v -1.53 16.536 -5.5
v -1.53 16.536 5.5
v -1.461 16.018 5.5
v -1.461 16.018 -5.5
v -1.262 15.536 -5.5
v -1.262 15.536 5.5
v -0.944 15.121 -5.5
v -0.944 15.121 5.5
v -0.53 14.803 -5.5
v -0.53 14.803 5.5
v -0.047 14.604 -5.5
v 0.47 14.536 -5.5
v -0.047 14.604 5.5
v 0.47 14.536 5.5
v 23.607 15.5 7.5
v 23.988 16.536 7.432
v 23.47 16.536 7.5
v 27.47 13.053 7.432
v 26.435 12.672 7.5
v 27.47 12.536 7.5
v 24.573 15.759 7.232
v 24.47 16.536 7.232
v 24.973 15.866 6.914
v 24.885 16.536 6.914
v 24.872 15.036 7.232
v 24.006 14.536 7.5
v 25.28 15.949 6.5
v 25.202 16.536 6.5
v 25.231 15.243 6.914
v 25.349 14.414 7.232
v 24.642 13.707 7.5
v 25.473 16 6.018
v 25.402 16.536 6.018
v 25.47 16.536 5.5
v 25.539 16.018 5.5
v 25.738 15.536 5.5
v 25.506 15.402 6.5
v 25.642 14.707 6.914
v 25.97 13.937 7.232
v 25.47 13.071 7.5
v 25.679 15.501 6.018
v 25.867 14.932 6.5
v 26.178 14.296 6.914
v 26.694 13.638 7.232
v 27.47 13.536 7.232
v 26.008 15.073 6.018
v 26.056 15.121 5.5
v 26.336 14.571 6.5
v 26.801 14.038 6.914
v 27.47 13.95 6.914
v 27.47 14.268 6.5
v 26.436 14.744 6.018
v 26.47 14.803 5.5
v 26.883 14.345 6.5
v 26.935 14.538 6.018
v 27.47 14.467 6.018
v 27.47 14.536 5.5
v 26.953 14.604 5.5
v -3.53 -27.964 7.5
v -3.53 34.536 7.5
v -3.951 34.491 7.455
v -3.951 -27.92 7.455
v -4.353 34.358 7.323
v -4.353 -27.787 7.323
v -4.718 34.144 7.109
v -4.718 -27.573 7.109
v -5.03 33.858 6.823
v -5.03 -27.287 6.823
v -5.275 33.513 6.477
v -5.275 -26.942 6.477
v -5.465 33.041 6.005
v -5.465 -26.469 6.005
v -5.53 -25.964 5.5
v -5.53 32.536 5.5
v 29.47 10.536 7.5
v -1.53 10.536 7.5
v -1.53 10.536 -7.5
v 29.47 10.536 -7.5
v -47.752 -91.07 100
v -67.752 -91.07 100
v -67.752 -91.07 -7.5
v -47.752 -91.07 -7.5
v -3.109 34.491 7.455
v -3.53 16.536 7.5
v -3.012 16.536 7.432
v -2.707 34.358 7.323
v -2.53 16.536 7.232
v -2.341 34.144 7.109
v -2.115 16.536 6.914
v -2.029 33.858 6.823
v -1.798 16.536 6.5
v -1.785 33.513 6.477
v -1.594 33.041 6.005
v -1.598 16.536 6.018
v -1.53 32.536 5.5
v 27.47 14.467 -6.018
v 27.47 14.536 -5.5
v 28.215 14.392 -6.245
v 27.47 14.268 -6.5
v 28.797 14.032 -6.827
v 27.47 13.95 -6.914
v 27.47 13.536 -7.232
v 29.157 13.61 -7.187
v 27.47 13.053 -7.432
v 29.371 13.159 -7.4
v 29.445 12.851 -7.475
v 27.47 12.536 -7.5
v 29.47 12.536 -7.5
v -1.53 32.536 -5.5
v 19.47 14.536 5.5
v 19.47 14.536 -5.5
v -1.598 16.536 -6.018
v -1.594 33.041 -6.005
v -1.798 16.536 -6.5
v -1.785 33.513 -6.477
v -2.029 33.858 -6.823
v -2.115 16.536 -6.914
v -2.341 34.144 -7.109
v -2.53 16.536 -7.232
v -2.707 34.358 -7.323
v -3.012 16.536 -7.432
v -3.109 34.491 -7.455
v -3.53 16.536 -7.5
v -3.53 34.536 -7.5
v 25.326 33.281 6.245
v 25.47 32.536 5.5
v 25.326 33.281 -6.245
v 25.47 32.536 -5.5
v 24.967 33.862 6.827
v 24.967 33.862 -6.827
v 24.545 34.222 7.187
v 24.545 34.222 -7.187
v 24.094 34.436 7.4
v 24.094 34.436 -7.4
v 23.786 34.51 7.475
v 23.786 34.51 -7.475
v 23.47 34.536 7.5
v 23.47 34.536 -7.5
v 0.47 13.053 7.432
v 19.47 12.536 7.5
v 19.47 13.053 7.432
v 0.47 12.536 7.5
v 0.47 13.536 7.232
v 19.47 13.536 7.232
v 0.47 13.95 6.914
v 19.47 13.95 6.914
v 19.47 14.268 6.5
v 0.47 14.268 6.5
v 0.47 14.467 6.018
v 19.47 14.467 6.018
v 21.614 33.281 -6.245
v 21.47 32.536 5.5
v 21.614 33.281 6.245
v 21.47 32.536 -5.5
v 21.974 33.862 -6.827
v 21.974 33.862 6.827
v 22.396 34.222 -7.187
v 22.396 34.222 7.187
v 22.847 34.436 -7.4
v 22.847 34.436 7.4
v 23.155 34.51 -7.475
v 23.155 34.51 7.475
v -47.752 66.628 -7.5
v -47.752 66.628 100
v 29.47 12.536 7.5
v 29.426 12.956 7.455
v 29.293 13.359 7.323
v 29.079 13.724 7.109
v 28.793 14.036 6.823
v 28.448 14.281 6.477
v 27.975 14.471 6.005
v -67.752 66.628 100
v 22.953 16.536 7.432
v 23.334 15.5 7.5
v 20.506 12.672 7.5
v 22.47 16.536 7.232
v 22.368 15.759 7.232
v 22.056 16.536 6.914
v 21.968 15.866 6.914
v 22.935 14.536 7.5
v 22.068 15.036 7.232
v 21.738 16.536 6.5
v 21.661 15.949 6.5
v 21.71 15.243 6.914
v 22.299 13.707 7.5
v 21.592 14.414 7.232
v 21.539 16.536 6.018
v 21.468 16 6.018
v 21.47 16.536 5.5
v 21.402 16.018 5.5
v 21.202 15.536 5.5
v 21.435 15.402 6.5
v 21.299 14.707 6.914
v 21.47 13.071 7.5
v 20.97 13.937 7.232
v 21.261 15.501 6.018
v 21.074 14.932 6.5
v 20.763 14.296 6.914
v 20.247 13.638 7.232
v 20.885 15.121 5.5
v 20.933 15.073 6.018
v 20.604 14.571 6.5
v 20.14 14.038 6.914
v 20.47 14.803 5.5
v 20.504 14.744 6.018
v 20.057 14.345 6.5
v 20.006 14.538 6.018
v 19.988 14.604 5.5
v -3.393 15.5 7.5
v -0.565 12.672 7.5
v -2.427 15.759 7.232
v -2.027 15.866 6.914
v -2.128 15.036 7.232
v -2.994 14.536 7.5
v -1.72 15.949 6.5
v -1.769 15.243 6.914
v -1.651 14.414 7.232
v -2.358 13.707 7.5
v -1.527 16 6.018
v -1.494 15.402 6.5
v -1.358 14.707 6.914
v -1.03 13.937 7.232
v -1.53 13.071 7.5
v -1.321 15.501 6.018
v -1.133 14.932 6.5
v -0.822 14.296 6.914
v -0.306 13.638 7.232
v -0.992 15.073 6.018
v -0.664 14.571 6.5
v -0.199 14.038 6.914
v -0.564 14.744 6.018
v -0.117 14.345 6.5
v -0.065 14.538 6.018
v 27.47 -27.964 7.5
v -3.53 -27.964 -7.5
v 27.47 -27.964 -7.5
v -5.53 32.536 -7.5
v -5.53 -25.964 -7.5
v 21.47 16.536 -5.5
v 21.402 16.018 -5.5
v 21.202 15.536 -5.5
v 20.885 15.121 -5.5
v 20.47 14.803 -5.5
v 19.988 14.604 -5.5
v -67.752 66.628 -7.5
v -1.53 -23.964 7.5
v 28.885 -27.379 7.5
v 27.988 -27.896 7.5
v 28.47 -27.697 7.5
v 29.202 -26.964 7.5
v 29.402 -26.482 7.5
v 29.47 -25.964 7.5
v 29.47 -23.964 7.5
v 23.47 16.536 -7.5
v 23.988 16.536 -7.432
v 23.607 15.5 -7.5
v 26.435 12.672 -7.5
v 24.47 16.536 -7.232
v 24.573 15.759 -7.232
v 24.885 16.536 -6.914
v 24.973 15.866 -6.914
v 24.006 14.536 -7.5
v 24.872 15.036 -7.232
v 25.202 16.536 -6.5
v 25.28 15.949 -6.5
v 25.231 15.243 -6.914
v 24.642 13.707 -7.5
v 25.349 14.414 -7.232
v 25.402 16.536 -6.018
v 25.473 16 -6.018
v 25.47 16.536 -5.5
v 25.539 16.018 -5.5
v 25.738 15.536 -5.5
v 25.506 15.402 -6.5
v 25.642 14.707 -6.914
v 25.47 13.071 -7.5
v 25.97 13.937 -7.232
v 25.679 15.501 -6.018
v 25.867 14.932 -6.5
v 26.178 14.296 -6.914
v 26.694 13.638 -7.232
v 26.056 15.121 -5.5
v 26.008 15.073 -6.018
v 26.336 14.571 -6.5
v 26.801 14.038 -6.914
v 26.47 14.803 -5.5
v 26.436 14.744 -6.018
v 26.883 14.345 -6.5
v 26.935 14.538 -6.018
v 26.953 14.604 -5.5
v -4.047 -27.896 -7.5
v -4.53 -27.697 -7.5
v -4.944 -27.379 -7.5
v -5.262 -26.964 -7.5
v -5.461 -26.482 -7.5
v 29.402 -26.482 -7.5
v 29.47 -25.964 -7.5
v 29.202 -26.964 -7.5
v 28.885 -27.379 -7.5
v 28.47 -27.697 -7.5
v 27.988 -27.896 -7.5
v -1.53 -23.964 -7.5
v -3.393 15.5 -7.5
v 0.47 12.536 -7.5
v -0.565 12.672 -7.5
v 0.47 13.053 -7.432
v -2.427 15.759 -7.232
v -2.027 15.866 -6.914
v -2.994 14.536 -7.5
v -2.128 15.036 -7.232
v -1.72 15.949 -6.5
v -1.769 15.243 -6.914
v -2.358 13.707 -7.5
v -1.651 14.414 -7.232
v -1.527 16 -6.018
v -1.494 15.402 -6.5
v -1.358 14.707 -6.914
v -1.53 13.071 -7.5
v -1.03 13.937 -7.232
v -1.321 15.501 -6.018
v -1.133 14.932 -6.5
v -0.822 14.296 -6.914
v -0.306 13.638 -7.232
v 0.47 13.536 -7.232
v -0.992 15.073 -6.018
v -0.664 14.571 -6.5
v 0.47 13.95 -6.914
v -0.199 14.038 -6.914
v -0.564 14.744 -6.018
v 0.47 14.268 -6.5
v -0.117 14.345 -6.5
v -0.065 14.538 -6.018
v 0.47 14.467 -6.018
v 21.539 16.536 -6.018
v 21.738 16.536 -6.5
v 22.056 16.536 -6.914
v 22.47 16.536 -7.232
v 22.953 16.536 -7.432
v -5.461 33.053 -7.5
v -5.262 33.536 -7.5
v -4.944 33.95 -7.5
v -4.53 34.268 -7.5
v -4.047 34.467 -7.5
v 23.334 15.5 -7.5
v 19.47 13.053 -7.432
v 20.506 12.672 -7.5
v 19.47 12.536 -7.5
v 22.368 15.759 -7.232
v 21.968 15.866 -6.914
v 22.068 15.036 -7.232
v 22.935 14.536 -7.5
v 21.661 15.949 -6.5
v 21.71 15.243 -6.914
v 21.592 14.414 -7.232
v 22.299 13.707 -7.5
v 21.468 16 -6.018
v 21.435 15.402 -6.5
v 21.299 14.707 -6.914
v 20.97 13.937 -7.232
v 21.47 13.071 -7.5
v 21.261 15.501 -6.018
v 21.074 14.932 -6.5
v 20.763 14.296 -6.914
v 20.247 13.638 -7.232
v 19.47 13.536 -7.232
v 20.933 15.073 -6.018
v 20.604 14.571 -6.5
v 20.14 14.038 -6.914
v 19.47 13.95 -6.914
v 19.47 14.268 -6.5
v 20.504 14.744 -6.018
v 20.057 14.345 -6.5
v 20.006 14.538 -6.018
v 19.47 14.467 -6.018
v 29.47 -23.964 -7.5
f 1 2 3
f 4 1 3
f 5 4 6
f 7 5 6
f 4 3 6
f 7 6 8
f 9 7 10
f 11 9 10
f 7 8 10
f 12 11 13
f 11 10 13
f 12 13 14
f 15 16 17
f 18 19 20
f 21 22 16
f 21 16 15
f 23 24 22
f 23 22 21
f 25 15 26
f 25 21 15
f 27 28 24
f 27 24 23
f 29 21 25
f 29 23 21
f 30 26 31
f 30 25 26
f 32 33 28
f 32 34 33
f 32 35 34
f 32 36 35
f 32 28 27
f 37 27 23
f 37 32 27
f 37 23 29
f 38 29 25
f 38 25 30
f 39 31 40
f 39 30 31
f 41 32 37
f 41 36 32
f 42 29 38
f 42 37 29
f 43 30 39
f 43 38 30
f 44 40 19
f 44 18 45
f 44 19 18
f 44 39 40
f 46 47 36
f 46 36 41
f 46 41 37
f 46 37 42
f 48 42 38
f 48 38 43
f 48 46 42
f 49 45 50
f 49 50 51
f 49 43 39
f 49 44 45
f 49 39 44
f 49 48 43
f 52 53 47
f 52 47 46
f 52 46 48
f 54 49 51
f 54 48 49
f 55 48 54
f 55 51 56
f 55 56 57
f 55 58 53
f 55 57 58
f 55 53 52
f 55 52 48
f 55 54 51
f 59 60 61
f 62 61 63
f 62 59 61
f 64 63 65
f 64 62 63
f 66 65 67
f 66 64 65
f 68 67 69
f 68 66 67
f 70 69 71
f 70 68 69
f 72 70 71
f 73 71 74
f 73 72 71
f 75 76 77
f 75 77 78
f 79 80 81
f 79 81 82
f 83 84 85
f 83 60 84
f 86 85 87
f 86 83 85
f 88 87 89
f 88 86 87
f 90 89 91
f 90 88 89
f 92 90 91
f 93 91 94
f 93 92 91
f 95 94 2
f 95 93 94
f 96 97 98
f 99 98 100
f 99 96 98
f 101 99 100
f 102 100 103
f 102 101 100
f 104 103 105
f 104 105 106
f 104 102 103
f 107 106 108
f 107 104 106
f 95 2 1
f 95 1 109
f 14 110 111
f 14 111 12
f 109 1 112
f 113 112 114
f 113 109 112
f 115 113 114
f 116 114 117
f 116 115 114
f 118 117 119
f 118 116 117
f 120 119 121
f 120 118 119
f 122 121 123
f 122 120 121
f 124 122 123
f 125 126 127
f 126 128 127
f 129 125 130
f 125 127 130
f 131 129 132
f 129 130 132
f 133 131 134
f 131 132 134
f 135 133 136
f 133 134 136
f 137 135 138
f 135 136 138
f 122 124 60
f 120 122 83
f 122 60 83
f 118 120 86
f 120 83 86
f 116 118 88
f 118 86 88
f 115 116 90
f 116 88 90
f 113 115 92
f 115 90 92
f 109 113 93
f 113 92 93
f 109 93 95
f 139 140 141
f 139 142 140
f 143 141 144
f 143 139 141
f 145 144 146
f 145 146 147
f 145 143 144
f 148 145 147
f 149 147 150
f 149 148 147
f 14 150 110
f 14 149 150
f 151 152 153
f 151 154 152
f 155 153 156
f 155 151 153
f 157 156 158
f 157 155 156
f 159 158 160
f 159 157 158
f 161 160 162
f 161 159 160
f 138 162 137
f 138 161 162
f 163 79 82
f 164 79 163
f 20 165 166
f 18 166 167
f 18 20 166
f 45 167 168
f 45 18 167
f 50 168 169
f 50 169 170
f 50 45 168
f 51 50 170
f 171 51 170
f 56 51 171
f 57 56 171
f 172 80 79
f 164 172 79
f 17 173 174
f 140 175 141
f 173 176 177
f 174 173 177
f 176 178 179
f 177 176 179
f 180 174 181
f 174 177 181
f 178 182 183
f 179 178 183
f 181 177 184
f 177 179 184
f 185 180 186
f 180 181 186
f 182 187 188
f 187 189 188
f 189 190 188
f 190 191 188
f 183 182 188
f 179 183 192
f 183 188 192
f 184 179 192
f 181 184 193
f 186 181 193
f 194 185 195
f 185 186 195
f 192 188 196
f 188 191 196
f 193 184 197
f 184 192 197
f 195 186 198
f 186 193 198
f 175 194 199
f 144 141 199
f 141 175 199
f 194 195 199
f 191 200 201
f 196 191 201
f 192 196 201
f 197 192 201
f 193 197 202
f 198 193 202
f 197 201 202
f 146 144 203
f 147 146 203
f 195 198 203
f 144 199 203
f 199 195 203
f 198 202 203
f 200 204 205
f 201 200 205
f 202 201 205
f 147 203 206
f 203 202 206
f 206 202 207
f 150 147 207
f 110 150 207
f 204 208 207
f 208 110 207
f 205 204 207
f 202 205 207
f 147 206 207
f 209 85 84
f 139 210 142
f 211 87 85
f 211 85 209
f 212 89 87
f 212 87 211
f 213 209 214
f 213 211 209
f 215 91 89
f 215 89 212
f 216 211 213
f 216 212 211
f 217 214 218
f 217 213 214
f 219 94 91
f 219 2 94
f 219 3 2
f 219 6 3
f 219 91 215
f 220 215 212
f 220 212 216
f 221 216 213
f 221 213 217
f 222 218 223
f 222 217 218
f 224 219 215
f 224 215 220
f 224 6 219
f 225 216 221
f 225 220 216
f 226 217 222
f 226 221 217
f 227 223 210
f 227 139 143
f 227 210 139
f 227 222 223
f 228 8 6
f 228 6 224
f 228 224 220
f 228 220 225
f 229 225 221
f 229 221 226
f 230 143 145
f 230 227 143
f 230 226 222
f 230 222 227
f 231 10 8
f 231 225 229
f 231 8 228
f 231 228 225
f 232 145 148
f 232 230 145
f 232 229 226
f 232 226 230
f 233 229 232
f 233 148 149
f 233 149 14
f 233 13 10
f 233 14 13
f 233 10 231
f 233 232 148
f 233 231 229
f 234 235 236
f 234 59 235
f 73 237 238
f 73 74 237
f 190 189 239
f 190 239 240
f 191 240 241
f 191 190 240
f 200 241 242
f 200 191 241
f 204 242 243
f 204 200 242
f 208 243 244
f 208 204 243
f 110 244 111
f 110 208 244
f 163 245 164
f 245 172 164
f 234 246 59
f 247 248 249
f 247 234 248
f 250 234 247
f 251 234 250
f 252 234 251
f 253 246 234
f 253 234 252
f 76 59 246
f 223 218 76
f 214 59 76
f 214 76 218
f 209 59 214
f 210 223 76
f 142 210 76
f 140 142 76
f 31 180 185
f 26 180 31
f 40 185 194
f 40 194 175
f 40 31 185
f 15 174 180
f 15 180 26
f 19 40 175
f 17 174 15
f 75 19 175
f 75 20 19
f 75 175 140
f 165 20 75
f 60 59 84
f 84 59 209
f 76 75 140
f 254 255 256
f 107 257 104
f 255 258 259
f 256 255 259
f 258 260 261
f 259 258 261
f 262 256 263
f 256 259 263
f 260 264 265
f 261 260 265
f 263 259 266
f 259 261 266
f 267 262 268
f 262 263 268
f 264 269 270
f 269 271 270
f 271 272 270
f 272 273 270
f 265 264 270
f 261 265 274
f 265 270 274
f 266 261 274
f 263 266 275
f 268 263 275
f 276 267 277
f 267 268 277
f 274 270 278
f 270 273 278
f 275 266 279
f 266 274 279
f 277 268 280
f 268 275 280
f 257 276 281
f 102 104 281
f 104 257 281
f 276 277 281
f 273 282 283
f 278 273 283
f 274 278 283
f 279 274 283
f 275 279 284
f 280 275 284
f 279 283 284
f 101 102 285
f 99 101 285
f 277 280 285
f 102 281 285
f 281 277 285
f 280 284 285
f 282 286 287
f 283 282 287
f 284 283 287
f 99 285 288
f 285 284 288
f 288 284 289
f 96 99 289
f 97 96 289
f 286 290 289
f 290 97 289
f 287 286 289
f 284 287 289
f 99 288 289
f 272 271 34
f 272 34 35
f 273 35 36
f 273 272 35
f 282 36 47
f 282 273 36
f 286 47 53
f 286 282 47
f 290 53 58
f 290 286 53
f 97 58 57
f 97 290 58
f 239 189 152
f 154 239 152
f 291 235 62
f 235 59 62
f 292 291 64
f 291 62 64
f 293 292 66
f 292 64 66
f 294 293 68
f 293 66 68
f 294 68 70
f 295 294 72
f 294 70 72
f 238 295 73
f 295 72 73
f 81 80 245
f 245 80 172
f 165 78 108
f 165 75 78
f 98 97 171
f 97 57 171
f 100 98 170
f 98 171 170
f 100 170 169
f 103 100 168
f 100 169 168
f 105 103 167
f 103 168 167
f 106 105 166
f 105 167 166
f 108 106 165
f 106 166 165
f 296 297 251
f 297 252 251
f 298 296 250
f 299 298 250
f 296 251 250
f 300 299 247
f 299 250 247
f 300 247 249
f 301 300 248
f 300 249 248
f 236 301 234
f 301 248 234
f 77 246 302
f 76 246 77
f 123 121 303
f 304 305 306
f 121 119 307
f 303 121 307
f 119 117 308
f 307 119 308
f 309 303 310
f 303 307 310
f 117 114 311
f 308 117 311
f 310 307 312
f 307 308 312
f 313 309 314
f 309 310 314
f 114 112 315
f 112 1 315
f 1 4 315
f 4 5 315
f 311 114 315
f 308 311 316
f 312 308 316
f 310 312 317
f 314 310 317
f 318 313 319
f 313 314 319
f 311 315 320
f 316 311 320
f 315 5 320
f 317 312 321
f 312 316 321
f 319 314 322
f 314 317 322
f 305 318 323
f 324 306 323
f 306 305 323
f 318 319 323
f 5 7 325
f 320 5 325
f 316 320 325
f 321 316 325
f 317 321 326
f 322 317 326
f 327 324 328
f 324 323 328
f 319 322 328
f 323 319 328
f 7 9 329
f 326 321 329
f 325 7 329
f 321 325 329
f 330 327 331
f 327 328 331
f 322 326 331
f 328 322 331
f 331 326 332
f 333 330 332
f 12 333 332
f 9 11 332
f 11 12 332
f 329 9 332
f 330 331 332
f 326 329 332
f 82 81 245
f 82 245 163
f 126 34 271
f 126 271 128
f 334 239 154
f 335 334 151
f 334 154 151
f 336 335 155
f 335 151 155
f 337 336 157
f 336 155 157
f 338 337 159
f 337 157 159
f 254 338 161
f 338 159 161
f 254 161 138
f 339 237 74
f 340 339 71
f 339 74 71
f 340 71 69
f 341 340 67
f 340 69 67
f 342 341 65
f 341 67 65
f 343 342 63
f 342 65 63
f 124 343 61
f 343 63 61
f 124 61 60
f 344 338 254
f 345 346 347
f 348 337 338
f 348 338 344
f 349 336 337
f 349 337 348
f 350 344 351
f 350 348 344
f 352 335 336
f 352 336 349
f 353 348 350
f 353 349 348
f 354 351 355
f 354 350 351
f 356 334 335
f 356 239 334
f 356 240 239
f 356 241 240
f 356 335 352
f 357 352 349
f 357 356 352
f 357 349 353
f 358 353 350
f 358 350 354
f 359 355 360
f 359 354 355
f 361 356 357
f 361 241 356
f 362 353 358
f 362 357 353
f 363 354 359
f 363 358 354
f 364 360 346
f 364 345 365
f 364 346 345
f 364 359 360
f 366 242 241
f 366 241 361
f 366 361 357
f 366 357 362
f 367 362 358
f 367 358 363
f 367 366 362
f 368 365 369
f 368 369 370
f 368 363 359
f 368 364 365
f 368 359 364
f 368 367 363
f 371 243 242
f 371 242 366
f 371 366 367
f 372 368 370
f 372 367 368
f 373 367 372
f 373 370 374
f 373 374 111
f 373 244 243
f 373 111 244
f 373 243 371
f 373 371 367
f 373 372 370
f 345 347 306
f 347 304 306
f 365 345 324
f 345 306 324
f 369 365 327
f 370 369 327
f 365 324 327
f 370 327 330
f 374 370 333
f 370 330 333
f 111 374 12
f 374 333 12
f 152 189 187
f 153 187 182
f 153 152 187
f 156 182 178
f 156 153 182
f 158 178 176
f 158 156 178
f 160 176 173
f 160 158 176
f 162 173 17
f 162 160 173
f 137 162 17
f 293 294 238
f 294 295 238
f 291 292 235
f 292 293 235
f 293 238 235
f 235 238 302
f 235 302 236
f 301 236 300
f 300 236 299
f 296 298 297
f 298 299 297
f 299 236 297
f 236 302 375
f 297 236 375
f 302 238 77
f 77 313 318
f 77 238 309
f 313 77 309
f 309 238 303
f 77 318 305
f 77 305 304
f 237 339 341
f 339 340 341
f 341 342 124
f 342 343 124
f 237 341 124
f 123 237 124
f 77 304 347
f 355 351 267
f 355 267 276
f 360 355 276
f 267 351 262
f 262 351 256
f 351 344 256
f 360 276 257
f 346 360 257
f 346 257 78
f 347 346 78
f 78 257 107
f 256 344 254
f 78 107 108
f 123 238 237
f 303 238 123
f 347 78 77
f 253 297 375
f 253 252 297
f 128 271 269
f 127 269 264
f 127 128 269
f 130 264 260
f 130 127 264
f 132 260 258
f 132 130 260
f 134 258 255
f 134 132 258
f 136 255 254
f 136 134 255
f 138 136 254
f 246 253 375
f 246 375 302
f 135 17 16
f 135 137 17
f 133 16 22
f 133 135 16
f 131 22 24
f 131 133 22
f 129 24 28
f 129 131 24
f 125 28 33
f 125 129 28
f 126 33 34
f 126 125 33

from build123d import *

# Parameters (mm, degrees)
F0_W     = 20
F0_H     = 157.6981320977
F1_DEPTH = 7.5
F0_W_2   = 4
F0_H_2   = 20
F2_R     = 1.99999
F3_DEPTH = 100


# Not quite as in the source:
# - a fillet or chamfer is up to 0.001 mm smaller than in the source, because OpenCascade refuses the exact size


with BuildPart() as f1:
    # F0 (on Top) → F1 (new body, symmetric)
    with BuildSketch(Plane.XY):
        with Locations((-57.7521377802, -12.2206695378)):
            Rectangle(F0_W, F0_H)
    extrude(amount=F1_DEPTH, both=True)

    # F0 (on Top) → F3 (join)
    with BuildSketch(Plane.XY):
        with Locations((-57.7521377802, -12.2206695378)):
            Rectangle(F0_W, F0_H)
    extrude(amount=F3_DEPTH)


with BuildPart() as f1b:
    # F0 (on Top) → F1, piece 2 (new body, symmetric)
    with BuildSketch(Plane.XY):
        with Locations((23.4704200836, 24.5355388032)):
            Rectangle(F0_W_2, F0_H_2)
        Polygon((29.4704200836, 10.5355388032), (29.4704200836, 14.5355388032), (25.4704200836, 14.5355388032), (21.4704200836, 14.5355388032), (-1.5295799164, 14.5355388032), (-5.5295799164, 14.5355388032), (-5.5295799164, -27.9644611968), (29.4704200836, -27.9644611968), (29.4704200836, -23.9644611968), (27.4704200836, -23.9644611968), (-1.5295799164, -23.9644611968), (-1.5295799164, 10.5355388032), (27.4704200836, 10.5355388032), align=None)
        with Locations((-3.5295799164, 24.5355388032)):
            Rectangle(F0_W_2, F0_H_2)
    extrude(amount=F1_DEPTH, both=True)

    # F2 (radius 2 in the source; OpenCascade refuses exactly that, so slightly less here)
    f2_edges = [f1b.edges().sort_by_distance(p)[0] for p in [
        (9.97042, 14.535539, 7.5),
        (27.47042, 14.535539, 7.5),
        (9.97042, 14.535539, -7.5),
        (27.47042, 14.535539, -7.5),
        (-5.52958, 3.285539, 7.5),
        (29.47042, -27.964461, 0),
        (-5.52958, -27.964461, 0),
        (29.47042, 14.535539, 0),
        (25.47042, 34.535539, 0),
        (-1.52958, 34.535539, 0),
        (21.47042, 34.535539, 0),
        (-5.52958, 34.535539, 0),
        (25.47042, 14.535539, 0),
        (21.47042, 14.535539, 0),
        (-1.52958, 14.535539, 0),
        (25.47042, 24.535539, -7.5),
        (25.47042, 24.535539, 7.5),
        (-1.52958, 24.535539, -7.5),
        (-1.52958, 24.535539, 7.5),
        (21.47042, 24.535539, -7.5),
        (21.47042, 24.535539, 7.5),
    ]]
    fillet(f2_edges, radius=F2_R)


solid = Compound([f1.part, f1b.part])
